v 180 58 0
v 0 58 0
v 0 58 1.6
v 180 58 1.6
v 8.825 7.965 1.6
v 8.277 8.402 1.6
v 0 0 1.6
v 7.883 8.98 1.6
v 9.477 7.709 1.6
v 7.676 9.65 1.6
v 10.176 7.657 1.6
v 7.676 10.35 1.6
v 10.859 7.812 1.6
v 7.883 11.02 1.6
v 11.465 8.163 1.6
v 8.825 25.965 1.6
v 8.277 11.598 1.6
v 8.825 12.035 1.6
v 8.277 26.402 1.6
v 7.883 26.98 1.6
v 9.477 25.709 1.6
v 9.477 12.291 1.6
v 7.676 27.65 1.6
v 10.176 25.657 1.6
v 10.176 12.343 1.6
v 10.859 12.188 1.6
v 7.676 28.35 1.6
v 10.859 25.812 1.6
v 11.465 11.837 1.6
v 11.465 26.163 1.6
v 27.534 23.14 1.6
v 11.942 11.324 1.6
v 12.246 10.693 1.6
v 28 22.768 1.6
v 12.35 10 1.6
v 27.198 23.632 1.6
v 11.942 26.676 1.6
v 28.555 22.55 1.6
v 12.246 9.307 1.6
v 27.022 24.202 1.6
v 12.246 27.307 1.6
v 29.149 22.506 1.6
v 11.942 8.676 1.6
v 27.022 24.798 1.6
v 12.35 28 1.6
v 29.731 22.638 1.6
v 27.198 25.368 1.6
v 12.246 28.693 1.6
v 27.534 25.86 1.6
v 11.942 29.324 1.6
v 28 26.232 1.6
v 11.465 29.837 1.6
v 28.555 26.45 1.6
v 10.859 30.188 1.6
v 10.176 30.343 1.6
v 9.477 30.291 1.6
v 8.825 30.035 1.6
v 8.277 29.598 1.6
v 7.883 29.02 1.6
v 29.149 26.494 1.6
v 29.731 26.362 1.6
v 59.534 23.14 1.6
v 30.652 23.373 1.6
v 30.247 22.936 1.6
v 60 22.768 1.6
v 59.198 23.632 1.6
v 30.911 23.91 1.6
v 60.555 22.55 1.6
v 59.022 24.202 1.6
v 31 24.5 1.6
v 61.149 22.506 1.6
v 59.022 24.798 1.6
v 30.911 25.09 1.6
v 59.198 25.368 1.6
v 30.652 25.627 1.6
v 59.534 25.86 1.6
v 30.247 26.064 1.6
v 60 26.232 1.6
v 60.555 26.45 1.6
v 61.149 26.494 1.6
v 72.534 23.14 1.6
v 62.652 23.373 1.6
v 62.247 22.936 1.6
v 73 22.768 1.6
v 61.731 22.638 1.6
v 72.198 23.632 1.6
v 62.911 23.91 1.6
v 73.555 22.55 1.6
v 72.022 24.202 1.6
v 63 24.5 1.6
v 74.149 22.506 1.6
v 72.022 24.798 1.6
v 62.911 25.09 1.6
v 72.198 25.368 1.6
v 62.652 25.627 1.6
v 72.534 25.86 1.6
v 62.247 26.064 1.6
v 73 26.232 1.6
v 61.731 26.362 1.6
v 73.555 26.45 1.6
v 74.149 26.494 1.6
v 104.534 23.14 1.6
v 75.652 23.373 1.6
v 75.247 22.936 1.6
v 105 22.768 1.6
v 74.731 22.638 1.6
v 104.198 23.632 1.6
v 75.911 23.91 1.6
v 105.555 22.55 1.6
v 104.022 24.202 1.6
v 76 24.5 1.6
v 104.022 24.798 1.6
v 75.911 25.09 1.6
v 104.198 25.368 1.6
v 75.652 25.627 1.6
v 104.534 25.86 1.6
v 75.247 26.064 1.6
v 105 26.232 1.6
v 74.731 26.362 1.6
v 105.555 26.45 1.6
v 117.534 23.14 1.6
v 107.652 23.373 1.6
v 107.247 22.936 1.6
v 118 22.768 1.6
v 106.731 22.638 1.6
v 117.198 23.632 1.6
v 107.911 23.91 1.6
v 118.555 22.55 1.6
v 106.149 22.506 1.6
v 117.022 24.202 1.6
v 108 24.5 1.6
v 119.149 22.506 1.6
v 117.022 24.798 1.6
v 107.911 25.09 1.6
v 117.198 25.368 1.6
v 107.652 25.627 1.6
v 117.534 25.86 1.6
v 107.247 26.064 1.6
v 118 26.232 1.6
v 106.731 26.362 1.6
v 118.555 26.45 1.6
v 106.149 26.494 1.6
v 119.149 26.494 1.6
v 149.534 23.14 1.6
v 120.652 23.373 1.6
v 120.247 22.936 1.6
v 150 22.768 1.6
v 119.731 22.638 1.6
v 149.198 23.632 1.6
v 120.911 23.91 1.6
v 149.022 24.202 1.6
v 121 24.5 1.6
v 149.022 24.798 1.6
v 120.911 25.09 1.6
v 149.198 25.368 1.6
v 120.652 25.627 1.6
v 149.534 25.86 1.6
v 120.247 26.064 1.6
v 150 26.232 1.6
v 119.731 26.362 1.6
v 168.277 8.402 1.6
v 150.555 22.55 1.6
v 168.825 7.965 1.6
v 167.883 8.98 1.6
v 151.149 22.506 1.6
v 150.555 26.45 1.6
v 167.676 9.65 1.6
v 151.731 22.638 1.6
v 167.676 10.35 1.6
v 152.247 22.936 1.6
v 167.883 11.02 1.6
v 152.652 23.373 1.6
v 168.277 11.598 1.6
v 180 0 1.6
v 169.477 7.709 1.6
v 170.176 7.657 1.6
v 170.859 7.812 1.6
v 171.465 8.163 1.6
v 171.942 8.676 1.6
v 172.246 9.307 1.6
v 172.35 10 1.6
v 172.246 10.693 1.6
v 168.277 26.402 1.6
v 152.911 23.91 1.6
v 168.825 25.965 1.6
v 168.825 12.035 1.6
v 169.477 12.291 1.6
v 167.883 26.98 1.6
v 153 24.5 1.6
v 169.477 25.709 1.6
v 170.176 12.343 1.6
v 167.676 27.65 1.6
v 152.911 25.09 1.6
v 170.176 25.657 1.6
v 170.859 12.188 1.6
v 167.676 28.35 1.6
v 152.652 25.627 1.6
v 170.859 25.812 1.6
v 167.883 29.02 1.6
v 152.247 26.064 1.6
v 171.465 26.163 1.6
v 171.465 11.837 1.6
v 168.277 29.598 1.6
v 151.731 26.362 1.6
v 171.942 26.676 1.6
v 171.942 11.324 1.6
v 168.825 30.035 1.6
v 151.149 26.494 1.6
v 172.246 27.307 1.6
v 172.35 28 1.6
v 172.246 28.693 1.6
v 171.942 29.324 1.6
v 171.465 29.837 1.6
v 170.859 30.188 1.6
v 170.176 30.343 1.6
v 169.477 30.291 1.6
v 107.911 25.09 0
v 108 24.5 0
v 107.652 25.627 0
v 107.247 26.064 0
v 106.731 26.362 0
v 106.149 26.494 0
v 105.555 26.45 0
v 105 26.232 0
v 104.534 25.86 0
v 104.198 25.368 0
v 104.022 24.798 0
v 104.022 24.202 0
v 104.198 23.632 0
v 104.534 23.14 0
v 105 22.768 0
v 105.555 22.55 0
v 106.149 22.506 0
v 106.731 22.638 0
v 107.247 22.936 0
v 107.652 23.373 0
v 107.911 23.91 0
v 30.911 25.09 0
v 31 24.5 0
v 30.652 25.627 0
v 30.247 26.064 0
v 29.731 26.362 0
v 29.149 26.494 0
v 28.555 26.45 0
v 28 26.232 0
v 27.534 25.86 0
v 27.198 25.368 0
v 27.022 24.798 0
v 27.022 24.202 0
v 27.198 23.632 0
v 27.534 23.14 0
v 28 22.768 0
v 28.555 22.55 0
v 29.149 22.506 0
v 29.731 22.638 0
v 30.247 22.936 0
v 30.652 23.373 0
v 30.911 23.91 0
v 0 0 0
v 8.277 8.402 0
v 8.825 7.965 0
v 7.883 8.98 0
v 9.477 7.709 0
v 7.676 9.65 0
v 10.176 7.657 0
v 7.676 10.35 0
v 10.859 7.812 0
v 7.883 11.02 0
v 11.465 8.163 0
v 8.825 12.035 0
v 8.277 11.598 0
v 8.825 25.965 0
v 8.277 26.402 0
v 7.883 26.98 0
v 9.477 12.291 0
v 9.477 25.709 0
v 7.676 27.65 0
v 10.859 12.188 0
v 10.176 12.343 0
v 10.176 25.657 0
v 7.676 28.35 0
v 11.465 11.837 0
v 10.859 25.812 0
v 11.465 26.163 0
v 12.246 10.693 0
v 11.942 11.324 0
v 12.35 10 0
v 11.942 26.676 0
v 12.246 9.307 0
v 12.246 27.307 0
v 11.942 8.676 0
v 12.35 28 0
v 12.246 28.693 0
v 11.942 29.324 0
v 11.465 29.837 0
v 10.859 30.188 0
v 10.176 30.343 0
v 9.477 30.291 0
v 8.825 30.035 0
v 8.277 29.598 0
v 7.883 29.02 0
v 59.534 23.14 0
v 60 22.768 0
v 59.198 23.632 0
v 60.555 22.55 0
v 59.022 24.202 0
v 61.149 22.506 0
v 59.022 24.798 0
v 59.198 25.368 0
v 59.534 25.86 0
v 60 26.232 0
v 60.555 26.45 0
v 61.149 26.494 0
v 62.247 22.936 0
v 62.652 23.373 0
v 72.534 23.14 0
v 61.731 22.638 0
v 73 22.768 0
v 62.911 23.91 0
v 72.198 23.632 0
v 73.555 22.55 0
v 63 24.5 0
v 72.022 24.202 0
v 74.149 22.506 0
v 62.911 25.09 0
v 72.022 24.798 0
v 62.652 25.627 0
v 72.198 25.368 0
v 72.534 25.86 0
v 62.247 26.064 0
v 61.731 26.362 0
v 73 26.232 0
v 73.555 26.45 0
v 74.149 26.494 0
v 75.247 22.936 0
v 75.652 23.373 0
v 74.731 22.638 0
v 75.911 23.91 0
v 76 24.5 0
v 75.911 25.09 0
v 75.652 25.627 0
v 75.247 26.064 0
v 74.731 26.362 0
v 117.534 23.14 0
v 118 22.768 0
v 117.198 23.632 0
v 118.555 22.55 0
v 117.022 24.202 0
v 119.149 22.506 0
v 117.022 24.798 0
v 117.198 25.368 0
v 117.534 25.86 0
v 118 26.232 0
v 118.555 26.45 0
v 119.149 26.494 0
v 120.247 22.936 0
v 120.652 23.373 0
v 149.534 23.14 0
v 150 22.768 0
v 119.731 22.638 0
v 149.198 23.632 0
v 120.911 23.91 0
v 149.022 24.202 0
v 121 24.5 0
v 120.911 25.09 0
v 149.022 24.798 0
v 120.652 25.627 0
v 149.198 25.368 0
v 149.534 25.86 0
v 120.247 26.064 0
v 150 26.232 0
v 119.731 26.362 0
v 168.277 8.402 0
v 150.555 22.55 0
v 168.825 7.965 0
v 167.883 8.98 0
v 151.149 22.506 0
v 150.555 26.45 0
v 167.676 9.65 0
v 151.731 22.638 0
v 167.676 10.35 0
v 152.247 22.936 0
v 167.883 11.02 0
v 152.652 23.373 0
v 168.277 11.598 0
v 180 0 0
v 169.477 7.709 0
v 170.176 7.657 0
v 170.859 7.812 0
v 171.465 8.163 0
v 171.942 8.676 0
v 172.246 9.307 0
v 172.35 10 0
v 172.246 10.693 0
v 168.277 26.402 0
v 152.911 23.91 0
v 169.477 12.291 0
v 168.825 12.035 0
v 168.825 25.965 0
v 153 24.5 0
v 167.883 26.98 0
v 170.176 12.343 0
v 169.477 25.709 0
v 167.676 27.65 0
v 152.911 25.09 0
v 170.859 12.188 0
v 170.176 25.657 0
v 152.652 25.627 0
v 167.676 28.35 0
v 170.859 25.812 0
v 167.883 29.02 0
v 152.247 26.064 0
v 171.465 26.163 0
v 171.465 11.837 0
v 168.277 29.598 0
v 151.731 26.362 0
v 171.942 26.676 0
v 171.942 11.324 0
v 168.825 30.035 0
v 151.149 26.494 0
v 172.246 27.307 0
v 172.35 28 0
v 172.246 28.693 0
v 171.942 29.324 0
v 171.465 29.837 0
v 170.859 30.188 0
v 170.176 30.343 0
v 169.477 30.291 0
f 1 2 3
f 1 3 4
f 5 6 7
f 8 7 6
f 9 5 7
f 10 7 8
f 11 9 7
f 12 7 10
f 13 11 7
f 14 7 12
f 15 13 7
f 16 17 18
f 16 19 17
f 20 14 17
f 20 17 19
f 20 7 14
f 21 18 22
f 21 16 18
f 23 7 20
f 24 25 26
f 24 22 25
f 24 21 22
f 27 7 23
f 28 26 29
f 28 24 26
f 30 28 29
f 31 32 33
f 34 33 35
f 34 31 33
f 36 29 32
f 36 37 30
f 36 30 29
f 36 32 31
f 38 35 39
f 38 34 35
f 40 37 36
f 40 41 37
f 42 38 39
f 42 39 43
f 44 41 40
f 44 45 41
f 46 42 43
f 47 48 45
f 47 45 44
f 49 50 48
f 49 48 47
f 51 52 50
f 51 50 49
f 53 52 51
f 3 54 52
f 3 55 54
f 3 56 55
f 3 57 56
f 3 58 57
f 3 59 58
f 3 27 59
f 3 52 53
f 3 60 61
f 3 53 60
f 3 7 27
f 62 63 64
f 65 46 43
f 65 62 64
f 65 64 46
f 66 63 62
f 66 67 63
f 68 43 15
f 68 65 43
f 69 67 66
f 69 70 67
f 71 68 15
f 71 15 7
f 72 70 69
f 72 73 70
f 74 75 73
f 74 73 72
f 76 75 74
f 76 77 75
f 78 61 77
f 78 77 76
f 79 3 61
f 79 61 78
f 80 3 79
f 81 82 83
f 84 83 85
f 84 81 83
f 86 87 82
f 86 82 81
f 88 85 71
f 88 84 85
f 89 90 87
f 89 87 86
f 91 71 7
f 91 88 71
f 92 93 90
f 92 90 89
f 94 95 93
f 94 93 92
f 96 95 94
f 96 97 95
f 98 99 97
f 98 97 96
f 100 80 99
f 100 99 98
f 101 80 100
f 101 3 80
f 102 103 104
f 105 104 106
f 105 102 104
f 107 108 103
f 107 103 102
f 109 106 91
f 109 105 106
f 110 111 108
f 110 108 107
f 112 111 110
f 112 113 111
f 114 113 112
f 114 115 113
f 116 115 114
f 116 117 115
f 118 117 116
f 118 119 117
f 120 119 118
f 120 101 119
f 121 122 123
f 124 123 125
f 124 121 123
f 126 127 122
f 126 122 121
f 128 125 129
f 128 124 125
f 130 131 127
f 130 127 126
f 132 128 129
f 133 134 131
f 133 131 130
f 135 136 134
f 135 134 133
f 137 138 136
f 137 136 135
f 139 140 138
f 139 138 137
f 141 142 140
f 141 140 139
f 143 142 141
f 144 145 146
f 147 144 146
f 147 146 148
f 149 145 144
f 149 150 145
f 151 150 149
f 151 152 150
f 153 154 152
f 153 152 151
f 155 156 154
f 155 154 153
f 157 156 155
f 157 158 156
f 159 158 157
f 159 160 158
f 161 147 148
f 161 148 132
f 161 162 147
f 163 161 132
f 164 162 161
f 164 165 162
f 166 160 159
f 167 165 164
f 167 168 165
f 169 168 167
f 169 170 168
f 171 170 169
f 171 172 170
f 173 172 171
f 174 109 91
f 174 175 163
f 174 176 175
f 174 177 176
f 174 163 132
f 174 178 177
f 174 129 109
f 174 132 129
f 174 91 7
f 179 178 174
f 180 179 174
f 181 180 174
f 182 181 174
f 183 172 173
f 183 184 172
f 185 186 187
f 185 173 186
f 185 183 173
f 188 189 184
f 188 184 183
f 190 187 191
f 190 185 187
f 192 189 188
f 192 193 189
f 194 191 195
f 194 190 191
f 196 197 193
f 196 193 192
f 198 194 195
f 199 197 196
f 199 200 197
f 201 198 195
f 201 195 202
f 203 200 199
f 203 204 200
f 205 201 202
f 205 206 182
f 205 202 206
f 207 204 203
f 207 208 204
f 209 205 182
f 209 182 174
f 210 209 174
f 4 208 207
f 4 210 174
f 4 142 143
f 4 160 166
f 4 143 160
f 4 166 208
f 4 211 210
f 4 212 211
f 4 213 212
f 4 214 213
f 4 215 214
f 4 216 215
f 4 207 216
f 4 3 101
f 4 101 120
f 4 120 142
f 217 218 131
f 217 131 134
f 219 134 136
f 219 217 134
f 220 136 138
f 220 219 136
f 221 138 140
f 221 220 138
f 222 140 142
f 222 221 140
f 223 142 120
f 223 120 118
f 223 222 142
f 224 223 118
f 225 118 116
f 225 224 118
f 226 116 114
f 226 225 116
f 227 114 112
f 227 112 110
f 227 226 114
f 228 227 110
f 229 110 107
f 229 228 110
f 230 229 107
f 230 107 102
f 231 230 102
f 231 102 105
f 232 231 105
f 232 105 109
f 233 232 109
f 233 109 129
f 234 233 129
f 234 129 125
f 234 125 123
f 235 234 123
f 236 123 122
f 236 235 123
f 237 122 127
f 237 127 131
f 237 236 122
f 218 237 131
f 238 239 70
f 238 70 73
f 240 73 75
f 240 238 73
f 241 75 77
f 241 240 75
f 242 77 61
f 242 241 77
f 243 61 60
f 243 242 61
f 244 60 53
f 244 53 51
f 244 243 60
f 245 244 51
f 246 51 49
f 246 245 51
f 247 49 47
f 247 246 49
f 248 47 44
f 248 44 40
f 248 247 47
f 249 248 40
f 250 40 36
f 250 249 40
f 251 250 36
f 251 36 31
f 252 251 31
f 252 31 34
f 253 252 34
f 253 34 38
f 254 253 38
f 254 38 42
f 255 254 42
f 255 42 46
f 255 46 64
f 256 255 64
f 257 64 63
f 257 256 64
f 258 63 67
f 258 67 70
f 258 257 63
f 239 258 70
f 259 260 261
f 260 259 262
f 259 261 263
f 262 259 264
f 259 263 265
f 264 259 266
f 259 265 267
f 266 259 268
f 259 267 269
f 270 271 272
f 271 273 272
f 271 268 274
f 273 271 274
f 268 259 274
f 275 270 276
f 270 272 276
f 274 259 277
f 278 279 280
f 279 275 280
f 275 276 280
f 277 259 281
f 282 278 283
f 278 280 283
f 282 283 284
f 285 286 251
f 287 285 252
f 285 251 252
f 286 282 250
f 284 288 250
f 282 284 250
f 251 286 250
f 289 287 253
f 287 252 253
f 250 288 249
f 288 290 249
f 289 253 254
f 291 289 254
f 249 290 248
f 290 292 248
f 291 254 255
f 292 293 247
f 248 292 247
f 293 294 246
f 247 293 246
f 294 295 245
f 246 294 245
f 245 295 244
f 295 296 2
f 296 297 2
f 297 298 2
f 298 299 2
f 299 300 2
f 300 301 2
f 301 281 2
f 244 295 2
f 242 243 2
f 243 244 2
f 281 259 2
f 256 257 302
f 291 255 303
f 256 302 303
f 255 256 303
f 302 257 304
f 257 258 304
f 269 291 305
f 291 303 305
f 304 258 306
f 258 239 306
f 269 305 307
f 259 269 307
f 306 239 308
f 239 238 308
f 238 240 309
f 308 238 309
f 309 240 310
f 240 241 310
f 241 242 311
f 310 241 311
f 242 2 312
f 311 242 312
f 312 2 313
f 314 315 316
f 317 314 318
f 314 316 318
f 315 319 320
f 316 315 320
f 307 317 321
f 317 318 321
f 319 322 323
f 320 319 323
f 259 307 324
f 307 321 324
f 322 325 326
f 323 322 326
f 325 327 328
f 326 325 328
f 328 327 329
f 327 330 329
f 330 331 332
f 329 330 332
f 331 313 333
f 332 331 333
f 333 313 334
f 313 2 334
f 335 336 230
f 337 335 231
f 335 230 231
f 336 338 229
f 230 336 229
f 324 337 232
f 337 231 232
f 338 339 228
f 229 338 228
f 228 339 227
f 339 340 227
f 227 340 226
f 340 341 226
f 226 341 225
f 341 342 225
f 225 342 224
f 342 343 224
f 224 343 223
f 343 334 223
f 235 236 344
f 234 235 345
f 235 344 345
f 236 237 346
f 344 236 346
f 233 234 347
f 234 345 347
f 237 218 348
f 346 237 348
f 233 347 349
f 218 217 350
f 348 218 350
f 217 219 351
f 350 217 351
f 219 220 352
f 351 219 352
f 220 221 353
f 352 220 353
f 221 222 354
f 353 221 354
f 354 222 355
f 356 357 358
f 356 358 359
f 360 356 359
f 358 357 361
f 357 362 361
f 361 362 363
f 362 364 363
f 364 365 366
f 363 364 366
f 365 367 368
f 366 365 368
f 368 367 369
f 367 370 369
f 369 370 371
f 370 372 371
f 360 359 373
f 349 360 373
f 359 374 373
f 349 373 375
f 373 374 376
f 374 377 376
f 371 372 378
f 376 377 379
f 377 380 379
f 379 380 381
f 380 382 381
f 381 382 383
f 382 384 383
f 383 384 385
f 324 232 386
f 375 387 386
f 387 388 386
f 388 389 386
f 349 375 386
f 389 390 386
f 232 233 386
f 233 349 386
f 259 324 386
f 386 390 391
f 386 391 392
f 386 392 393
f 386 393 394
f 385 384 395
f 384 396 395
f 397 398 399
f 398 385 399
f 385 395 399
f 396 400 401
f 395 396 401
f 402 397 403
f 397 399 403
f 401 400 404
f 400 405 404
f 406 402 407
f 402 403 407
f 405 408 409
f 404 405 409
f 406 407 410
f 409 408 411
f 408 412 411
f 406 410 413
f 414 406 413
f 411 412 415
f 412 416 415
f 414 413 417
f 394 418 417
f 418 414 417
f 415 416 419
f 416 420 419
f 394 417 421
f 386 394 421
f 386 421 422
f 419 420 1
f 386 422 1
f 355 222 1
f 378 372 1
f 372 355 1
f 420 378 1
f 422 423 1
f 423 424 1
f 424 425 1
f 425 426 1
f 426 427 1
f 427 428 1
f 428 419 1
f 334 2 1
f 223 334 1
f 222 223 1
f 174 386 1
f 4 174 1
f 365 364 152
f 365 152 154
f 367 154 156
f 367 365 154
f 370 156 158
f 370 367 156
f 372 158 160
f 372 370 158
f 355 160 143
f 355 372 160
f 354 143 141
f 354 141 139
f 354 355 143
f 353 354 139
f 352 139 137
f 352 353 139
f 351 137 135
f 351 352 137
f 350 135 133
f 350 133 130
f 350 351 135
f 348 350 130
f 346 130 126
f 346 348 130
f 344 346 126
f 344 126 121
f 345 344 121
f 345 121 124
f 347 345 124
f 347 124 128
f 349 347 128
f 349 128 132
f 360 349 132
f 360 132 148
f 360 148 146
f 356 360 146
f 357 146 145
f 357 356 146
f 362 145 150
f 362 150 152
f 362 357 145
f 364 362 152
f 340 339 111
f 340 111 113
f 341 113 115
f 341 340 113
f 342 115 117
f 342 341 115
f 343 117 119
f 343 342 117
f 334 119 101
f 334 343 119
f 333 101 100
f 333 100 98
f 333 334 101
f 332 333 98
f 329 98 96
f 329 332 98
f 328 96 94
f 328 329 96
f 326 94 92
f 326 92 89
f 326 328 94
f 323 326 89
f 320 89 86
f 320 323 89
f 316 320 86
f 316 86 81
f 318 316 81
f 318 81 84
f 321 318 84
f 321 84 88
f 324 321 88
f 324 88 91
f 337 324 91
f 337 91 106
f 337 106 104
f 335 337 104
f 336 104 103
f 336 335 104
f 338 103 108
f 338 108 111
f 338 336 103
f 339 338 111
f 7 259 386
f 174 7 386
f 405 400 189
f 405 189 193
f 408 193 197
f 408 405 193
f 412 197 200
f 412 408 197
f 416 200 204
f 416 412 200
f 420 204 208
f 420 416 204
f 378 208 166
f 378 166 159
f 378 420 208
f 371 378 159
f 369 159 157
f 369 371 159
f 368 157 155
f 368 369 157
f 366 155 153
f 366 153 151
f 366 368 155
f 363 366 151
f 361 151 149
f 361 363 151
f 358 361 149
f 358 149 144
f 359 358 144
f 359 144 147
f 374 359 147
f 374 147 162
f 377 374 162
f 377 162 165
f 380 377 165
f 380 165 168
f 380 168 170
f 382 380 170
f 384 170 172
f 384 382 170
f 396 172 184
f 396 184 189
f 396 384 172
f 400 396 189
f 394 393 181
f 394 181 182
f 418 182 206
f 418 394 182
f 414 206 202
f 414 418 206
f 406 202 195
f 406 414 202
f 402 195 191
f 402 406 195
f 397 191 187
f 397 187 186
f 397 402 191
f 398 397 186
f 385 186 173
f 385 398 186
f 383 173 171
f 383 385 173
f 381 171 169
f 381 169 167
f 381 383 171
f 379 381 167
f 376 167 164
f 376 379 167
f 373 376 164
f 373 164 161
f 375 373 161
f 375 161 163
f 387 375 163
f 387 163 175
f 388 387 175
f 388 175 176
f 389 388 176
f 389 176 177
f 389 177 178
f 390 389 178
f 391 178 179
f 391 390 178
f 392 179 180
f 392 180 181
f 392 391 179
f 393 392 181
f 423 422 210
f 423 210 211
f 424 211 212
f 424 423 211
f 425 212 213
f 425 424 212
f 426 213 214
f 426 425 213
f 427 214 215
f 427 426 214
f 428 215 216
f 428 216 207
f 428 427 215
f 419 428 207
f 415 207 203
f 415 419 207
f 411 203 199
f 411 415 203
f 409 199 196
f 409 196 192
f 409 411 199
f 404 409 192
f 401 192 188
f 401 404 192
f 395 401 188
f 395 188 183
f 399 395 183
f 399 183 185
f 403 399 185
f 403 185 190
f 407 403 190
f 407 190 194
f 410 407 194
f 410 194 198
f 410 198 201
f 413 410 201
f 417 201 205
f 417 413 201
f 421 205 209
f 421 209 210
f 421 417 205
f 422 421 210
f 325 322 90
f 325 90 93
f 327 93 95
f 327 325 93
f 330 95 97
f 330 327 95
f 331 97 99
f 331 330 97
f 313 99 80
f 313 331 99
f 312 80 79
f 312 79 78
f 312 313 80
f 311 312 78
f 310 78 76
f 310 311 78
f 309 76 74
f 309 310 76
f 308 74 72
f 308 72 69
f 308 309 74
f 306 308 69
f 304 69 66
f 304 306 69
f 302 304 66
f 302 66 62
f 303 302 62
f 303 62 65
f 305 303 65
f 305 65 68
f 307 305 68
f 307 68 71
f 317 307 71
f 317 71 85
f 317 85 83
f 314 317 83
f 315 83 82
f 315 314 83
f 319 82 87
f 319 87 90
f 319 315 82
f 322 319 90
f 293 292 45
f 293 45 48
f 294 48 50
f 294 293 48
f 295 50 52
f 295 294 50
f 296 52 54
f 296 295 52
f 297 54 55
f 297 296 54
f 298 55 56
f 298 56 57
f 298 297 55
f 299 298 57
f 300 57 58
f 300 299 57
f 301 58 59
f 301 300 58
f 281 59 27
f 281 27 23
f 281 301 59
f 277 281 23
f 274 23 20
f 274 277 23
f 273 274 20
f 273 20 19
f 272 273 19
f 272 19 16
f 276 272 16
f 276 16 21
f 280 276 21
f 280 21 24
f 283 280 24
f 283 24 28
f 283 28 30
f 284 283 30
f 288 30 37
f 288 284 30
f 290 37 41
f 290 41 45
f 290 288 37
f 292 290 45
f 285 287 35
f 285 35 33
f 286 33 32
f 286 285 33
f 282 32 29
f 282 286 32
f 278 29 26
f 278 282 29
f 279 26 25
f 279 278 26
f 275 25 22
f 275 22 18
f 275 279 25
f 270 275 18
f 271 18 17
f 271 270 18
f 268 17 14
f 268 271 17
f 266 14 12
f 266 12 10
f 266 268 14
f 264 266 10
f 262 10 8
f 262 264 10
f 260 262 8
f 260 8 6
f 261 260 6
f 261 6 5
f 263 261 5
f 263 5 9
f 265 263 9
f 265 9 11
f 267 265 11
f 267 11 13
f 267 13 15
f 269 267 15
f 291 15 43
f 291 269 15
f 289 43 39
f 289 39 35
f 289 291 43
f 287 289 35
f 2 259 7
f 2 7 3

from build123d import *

# Parameters (mm, degrees)
SKETCH1_W           = 180
SKETCH1_H           = 58
SKETCH1_R           = 2.35
SKETCH1_R_2         = 2
BOSS_EXTRUDE1_DEPTH = 1.6


with BuildPart() as part:
    # Sketch1 → Boss-Extrude1 (new body)
    with BuildSketch(Plane.XY):
        with Locations((90, 29)):
            Rectangle(SKETCH1_W, SKETCH1_H)
        with Locations((10, 28)):
            Circle(SKETCH1_R, mode=Mode.SUBTRACT)
        with Locations((10, 10)):
            Circle(SKETCH1_R, mode=Mode.SUBTRACT)
        with Locations((29, 24.5)):
            Circle(SKETCH1_R_2, mode=Mode.SUBTRACT)
        with Locations((61, 24.5)):
            Circle(SKETCH1_R_2, mode=Mode.SUBTRACT)
        with Locations((74, 24.5)):
            Circle(SKETCH1_R_2, mode=Mode.SUBTRACT)
        with Locations((106, 24.5)):
            Circle(SKETCH1_R_2, mode=Mode.SUBTRACT)
        with Locations((119, 24.5)):
            Circle(SKETCH1_R_2, mode=Mode.SUBTRACT)
        with Locations((151, 24.5)):
            Circle(SKETCH1_R_2, mode=Mode.SUBTRACT)
        with Locations((170, 28)):
            Circle(SKETCH1_R, mode=Mode.SUBTRACT)
        with Locations((170, 10)):
            Circle(SKETCH1_R, mode=Mode.SUBTRACT)
    extrude(amount=BOSS_EXTRUDE1_DEPTH)


solid = part.part
